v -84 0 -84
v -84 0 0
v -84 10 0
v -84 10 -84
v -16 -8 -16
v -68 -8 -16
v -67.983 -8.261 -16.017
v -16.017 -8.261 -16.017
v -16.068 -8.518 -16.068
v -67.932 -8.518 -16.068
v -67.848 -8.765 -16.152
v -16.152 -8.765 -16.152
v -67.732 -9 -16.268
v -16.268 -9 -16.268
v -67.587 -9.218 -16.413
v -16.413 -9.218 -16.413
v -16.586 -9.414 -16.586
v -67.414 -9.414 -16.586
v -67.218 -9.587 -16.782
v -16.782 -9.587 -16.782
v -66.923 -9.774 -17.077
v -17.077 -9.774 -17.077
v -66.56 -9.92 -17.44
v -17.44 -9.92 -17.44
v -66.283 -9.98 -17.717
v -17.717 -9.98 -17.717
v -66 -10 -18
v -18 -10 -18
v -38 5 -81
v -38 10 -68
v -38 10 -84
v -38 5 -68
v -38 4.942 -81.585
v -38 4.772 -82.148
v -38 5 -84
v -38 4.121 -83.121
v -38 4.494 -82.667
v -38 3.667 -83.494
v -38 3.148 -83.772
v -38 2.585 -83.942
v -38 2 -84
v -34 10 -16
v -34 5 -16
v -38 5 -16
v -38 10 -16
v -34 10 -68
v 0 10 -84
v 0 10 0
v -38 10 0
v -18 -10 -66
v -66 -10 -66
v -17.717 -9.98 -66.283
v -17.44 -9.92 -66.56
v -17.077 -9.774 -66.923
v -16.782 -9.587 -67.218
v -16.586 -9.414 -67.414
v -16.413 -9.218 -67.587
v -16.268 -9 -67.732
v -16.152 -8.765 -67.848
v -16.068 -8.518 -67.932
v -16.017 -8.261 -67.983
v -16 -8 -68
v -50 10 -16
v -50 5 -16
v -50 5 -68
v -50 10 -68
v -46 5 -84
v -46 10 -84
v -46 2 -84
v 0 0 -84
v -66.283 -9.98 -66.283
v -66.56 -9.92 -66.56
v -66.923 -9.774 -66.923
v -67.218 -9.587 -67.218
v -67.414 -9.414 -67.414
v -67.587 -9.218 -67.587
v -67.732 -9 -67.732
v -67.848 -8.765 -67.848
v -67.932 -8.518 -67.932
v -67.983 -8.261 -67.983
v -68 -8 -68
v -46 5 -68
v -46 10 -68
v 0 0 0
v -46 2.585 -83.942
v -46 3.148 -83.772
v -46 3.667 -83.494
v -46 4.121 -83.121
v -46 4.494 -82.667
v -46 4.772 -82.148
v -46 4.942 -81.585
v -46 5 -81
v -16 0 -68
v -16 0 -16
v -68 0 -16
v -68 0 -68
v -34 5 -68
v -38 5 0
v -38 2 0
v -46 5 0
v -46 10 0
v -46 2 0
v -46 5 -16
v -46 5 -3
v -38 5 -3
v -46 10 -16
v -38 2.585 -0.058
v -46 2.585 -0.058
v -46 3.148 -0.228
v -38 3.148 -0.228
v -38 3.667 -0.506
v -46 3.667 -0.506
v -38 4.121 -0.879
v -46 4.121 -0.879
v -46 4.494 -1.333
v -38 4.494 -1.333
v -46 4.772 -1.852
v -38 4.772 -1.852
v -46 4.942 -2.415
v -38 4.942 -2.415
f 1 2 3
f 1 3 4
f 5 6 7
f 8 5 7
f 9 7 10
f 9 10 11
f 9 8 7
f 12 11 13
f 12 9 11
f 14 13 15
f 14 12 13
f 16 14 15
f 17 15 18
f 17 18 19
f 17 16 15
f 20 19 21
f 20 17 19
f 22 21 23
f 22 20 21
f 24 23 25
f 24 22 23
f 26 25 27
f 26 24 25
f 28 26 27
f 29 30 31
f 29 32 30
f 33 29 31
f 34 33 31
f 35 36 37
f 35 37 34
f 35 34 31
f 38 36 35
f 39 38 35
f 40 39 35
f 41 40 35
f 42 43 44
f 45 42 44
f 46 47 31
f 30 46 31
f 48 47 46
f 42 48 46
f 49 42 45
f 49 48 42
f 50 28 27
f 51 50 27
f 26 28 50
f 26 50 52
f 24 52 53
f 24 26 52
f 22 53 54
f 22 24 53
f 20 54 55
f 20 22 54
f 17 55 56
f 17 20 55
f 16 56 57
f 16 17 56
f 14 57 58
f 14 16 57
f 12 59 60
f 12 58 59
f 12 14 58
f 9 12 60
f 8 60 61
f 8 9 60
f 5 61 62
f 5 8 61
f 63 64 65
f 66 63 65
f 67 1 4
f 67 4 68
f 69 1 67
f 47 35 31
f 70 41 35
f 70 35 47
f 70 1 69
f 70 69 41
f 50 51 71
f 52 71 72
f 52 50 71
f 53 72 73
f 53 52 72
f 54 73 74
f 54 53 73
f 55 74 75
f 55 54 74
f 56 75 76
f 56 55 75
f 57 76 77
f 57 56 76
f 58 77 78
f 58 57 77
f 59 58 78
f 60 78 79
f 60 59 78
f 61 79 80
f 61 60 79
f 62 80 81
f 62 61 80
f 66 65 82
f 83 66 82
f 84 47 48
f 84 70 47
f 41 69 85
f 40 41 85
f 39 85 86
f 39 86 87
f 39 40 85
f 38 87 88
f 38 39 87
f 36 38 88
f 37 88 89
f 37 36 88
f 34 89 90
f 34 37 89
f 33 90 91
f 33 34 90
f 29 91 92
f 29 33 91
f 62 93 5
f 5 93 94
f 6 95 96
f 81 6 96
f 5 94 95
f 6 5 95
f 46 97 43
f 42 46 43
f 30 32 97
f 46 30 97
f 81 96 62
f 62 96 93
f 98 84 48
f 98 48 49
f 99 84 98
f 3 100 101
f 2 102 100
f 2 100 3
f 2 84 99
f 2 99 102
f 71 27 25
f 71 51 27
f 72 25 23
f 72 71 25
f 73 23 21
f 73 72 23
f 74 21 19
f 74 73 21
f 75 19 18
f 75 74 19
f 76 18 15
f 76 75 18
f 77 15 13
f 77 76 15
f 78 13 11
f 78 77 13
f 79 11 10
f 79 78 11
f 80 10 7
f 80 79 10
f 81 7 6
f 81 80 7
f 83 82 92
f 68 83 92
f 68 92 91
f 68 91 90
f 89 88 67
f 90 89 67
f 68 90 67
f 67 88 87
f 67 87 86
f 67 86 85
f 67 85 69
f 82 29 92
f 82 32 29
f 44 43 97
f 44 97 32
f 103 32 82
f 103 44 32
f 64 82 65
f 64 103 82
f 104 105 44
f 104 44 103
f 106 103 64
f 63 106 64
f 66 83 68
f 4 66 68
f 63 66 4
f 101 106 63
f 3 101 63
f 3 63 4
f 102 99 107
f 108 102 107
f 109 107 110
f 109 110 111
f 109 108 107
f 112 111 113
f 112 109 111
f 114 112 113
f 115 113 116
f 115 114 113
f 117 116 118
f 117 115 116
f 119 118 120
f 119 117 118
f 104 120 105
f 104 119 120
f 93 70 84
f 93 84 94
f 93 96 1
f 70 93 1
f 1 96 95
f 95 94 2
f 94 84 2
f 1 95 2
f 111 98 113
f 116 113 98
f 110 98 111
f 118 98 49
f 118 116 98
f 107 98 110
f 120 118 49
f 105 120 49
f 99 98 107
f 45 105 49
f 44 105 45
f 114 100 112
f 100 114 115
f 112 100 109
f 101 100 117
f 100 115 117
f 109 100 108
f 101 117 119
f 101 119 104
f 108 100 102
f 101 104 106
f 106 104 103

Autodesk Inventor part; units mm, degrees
ref_plane "YZ Plane" through (0, 0, 0) normal (1, 0, 0) x (0, 1, 0)
ref_plane "XZ Plane" through (0, 0, 0) normal (0, 1, 0) x (-1, 0, 0)
ref_plane "XY Plane" through (0, 0, 0) normal (0, 0, 1) x (1, 0, 0)
sketch "Sketch1" plane through (0, 0, 0) normal (0, 1, 0) x (-1, 0, 0)
  line L0 (0, 0) -> (84, 0)
  line L1 (84, 0) -> (84, -84)
  line L2 (84, -84) -> (0, -84)
  line L3 (0, -84) -> (0, 0)
  line L4 (16, -16) -> (68, -16)
  line L5 (68, -16) -> (68, -68)
  line L6 (68, -68) -> (16, -68)
  line L7 (16, -68) -> (16, -16)
  line L8 (0, 0) -> (84, -84) construction
  line L9 (84, 0) -> (0, -84) construction
  line L10 (46, 0) -> (46, -16)
  line L11 (38, 0) -> (38, -16)
  line L12 (38, -68) -> (38, -84)
  line L13 (46, -68) -> (46, -84)
  line L14 (46, -76) -> (38, -76) construction
  line L15 (42, -76) -> (42, -68) construction
  line L16 (50, -16) -> (50, -68)
  line L17 (34, -68) -> (34, -16)
  dimension "d0" = 52
  dimension "d1" = 84
  dimension "d2" = 4
  dimension "d3" = 4
  dimension "d4" = 4
extrude "Extrusion1" add sketch "Sketch1" along normal blind 10 contours L0 L11 L4 L7 L6 L12 L2 L3 | L0 L1 L2 L13 L6 L5 L4 L10 | L17 L6 L7 L4 | L4 L5 L6 L16
extrude "Extrusion2" add sketch "Sketch1" along normal blind 5 contours L0 L10 L4 L11 | L4 L16 L6 L17 | L12 L6 L13 L2
extrude "Extrusion3" add sketch "Sketch1" against normal blind 10 contours L4 L16 L6 L17 | L17 L6 L7 L4 | L4 L5 L6 L16
fillet "Fillet1" radius 2 4 edges at (-68, -10, -42) (-42, -10, -16) (-16, -10, -42) (-42, -10, -68)
fillet "Fillet2" radius 3 2 edges at (-42, 5, 0) (-42, 5, -84)
equation "\"d0\" = inner_carriage_length - 2 * inner_carriage_width"
equation "\"d1\" = long_centerlegg_width"
equation "\"d2\" = cabel_shaft_size"
equation "\"d3\" = cabel_shaft_size"
equation "\"d4\" = cabel_shaft_size"
equation "\"d5\" = 0.5 * centerlegg_topplate_thicknes"
equation "\"d7\" = 0.5 * centerlegg_topplate_thicknes - centerlegg_grove_depth"
equation "\"d9\" = 0.5 * centerlegg_topplate_thicknes"
equation "\"centerlegg_topplate_thicknes\" = 20"
equation "\"centerlegg_grove_depth\" = 5"
equation "\"inner_carriage_length\" = 72"
equation "\"inner_carriage_width\" = 10"
equation "\"long_centerlegg_width\" = 84"
equation "\"cabel_shaft_size\" = 4"
properties part number "09_centerlegg_topplate"
